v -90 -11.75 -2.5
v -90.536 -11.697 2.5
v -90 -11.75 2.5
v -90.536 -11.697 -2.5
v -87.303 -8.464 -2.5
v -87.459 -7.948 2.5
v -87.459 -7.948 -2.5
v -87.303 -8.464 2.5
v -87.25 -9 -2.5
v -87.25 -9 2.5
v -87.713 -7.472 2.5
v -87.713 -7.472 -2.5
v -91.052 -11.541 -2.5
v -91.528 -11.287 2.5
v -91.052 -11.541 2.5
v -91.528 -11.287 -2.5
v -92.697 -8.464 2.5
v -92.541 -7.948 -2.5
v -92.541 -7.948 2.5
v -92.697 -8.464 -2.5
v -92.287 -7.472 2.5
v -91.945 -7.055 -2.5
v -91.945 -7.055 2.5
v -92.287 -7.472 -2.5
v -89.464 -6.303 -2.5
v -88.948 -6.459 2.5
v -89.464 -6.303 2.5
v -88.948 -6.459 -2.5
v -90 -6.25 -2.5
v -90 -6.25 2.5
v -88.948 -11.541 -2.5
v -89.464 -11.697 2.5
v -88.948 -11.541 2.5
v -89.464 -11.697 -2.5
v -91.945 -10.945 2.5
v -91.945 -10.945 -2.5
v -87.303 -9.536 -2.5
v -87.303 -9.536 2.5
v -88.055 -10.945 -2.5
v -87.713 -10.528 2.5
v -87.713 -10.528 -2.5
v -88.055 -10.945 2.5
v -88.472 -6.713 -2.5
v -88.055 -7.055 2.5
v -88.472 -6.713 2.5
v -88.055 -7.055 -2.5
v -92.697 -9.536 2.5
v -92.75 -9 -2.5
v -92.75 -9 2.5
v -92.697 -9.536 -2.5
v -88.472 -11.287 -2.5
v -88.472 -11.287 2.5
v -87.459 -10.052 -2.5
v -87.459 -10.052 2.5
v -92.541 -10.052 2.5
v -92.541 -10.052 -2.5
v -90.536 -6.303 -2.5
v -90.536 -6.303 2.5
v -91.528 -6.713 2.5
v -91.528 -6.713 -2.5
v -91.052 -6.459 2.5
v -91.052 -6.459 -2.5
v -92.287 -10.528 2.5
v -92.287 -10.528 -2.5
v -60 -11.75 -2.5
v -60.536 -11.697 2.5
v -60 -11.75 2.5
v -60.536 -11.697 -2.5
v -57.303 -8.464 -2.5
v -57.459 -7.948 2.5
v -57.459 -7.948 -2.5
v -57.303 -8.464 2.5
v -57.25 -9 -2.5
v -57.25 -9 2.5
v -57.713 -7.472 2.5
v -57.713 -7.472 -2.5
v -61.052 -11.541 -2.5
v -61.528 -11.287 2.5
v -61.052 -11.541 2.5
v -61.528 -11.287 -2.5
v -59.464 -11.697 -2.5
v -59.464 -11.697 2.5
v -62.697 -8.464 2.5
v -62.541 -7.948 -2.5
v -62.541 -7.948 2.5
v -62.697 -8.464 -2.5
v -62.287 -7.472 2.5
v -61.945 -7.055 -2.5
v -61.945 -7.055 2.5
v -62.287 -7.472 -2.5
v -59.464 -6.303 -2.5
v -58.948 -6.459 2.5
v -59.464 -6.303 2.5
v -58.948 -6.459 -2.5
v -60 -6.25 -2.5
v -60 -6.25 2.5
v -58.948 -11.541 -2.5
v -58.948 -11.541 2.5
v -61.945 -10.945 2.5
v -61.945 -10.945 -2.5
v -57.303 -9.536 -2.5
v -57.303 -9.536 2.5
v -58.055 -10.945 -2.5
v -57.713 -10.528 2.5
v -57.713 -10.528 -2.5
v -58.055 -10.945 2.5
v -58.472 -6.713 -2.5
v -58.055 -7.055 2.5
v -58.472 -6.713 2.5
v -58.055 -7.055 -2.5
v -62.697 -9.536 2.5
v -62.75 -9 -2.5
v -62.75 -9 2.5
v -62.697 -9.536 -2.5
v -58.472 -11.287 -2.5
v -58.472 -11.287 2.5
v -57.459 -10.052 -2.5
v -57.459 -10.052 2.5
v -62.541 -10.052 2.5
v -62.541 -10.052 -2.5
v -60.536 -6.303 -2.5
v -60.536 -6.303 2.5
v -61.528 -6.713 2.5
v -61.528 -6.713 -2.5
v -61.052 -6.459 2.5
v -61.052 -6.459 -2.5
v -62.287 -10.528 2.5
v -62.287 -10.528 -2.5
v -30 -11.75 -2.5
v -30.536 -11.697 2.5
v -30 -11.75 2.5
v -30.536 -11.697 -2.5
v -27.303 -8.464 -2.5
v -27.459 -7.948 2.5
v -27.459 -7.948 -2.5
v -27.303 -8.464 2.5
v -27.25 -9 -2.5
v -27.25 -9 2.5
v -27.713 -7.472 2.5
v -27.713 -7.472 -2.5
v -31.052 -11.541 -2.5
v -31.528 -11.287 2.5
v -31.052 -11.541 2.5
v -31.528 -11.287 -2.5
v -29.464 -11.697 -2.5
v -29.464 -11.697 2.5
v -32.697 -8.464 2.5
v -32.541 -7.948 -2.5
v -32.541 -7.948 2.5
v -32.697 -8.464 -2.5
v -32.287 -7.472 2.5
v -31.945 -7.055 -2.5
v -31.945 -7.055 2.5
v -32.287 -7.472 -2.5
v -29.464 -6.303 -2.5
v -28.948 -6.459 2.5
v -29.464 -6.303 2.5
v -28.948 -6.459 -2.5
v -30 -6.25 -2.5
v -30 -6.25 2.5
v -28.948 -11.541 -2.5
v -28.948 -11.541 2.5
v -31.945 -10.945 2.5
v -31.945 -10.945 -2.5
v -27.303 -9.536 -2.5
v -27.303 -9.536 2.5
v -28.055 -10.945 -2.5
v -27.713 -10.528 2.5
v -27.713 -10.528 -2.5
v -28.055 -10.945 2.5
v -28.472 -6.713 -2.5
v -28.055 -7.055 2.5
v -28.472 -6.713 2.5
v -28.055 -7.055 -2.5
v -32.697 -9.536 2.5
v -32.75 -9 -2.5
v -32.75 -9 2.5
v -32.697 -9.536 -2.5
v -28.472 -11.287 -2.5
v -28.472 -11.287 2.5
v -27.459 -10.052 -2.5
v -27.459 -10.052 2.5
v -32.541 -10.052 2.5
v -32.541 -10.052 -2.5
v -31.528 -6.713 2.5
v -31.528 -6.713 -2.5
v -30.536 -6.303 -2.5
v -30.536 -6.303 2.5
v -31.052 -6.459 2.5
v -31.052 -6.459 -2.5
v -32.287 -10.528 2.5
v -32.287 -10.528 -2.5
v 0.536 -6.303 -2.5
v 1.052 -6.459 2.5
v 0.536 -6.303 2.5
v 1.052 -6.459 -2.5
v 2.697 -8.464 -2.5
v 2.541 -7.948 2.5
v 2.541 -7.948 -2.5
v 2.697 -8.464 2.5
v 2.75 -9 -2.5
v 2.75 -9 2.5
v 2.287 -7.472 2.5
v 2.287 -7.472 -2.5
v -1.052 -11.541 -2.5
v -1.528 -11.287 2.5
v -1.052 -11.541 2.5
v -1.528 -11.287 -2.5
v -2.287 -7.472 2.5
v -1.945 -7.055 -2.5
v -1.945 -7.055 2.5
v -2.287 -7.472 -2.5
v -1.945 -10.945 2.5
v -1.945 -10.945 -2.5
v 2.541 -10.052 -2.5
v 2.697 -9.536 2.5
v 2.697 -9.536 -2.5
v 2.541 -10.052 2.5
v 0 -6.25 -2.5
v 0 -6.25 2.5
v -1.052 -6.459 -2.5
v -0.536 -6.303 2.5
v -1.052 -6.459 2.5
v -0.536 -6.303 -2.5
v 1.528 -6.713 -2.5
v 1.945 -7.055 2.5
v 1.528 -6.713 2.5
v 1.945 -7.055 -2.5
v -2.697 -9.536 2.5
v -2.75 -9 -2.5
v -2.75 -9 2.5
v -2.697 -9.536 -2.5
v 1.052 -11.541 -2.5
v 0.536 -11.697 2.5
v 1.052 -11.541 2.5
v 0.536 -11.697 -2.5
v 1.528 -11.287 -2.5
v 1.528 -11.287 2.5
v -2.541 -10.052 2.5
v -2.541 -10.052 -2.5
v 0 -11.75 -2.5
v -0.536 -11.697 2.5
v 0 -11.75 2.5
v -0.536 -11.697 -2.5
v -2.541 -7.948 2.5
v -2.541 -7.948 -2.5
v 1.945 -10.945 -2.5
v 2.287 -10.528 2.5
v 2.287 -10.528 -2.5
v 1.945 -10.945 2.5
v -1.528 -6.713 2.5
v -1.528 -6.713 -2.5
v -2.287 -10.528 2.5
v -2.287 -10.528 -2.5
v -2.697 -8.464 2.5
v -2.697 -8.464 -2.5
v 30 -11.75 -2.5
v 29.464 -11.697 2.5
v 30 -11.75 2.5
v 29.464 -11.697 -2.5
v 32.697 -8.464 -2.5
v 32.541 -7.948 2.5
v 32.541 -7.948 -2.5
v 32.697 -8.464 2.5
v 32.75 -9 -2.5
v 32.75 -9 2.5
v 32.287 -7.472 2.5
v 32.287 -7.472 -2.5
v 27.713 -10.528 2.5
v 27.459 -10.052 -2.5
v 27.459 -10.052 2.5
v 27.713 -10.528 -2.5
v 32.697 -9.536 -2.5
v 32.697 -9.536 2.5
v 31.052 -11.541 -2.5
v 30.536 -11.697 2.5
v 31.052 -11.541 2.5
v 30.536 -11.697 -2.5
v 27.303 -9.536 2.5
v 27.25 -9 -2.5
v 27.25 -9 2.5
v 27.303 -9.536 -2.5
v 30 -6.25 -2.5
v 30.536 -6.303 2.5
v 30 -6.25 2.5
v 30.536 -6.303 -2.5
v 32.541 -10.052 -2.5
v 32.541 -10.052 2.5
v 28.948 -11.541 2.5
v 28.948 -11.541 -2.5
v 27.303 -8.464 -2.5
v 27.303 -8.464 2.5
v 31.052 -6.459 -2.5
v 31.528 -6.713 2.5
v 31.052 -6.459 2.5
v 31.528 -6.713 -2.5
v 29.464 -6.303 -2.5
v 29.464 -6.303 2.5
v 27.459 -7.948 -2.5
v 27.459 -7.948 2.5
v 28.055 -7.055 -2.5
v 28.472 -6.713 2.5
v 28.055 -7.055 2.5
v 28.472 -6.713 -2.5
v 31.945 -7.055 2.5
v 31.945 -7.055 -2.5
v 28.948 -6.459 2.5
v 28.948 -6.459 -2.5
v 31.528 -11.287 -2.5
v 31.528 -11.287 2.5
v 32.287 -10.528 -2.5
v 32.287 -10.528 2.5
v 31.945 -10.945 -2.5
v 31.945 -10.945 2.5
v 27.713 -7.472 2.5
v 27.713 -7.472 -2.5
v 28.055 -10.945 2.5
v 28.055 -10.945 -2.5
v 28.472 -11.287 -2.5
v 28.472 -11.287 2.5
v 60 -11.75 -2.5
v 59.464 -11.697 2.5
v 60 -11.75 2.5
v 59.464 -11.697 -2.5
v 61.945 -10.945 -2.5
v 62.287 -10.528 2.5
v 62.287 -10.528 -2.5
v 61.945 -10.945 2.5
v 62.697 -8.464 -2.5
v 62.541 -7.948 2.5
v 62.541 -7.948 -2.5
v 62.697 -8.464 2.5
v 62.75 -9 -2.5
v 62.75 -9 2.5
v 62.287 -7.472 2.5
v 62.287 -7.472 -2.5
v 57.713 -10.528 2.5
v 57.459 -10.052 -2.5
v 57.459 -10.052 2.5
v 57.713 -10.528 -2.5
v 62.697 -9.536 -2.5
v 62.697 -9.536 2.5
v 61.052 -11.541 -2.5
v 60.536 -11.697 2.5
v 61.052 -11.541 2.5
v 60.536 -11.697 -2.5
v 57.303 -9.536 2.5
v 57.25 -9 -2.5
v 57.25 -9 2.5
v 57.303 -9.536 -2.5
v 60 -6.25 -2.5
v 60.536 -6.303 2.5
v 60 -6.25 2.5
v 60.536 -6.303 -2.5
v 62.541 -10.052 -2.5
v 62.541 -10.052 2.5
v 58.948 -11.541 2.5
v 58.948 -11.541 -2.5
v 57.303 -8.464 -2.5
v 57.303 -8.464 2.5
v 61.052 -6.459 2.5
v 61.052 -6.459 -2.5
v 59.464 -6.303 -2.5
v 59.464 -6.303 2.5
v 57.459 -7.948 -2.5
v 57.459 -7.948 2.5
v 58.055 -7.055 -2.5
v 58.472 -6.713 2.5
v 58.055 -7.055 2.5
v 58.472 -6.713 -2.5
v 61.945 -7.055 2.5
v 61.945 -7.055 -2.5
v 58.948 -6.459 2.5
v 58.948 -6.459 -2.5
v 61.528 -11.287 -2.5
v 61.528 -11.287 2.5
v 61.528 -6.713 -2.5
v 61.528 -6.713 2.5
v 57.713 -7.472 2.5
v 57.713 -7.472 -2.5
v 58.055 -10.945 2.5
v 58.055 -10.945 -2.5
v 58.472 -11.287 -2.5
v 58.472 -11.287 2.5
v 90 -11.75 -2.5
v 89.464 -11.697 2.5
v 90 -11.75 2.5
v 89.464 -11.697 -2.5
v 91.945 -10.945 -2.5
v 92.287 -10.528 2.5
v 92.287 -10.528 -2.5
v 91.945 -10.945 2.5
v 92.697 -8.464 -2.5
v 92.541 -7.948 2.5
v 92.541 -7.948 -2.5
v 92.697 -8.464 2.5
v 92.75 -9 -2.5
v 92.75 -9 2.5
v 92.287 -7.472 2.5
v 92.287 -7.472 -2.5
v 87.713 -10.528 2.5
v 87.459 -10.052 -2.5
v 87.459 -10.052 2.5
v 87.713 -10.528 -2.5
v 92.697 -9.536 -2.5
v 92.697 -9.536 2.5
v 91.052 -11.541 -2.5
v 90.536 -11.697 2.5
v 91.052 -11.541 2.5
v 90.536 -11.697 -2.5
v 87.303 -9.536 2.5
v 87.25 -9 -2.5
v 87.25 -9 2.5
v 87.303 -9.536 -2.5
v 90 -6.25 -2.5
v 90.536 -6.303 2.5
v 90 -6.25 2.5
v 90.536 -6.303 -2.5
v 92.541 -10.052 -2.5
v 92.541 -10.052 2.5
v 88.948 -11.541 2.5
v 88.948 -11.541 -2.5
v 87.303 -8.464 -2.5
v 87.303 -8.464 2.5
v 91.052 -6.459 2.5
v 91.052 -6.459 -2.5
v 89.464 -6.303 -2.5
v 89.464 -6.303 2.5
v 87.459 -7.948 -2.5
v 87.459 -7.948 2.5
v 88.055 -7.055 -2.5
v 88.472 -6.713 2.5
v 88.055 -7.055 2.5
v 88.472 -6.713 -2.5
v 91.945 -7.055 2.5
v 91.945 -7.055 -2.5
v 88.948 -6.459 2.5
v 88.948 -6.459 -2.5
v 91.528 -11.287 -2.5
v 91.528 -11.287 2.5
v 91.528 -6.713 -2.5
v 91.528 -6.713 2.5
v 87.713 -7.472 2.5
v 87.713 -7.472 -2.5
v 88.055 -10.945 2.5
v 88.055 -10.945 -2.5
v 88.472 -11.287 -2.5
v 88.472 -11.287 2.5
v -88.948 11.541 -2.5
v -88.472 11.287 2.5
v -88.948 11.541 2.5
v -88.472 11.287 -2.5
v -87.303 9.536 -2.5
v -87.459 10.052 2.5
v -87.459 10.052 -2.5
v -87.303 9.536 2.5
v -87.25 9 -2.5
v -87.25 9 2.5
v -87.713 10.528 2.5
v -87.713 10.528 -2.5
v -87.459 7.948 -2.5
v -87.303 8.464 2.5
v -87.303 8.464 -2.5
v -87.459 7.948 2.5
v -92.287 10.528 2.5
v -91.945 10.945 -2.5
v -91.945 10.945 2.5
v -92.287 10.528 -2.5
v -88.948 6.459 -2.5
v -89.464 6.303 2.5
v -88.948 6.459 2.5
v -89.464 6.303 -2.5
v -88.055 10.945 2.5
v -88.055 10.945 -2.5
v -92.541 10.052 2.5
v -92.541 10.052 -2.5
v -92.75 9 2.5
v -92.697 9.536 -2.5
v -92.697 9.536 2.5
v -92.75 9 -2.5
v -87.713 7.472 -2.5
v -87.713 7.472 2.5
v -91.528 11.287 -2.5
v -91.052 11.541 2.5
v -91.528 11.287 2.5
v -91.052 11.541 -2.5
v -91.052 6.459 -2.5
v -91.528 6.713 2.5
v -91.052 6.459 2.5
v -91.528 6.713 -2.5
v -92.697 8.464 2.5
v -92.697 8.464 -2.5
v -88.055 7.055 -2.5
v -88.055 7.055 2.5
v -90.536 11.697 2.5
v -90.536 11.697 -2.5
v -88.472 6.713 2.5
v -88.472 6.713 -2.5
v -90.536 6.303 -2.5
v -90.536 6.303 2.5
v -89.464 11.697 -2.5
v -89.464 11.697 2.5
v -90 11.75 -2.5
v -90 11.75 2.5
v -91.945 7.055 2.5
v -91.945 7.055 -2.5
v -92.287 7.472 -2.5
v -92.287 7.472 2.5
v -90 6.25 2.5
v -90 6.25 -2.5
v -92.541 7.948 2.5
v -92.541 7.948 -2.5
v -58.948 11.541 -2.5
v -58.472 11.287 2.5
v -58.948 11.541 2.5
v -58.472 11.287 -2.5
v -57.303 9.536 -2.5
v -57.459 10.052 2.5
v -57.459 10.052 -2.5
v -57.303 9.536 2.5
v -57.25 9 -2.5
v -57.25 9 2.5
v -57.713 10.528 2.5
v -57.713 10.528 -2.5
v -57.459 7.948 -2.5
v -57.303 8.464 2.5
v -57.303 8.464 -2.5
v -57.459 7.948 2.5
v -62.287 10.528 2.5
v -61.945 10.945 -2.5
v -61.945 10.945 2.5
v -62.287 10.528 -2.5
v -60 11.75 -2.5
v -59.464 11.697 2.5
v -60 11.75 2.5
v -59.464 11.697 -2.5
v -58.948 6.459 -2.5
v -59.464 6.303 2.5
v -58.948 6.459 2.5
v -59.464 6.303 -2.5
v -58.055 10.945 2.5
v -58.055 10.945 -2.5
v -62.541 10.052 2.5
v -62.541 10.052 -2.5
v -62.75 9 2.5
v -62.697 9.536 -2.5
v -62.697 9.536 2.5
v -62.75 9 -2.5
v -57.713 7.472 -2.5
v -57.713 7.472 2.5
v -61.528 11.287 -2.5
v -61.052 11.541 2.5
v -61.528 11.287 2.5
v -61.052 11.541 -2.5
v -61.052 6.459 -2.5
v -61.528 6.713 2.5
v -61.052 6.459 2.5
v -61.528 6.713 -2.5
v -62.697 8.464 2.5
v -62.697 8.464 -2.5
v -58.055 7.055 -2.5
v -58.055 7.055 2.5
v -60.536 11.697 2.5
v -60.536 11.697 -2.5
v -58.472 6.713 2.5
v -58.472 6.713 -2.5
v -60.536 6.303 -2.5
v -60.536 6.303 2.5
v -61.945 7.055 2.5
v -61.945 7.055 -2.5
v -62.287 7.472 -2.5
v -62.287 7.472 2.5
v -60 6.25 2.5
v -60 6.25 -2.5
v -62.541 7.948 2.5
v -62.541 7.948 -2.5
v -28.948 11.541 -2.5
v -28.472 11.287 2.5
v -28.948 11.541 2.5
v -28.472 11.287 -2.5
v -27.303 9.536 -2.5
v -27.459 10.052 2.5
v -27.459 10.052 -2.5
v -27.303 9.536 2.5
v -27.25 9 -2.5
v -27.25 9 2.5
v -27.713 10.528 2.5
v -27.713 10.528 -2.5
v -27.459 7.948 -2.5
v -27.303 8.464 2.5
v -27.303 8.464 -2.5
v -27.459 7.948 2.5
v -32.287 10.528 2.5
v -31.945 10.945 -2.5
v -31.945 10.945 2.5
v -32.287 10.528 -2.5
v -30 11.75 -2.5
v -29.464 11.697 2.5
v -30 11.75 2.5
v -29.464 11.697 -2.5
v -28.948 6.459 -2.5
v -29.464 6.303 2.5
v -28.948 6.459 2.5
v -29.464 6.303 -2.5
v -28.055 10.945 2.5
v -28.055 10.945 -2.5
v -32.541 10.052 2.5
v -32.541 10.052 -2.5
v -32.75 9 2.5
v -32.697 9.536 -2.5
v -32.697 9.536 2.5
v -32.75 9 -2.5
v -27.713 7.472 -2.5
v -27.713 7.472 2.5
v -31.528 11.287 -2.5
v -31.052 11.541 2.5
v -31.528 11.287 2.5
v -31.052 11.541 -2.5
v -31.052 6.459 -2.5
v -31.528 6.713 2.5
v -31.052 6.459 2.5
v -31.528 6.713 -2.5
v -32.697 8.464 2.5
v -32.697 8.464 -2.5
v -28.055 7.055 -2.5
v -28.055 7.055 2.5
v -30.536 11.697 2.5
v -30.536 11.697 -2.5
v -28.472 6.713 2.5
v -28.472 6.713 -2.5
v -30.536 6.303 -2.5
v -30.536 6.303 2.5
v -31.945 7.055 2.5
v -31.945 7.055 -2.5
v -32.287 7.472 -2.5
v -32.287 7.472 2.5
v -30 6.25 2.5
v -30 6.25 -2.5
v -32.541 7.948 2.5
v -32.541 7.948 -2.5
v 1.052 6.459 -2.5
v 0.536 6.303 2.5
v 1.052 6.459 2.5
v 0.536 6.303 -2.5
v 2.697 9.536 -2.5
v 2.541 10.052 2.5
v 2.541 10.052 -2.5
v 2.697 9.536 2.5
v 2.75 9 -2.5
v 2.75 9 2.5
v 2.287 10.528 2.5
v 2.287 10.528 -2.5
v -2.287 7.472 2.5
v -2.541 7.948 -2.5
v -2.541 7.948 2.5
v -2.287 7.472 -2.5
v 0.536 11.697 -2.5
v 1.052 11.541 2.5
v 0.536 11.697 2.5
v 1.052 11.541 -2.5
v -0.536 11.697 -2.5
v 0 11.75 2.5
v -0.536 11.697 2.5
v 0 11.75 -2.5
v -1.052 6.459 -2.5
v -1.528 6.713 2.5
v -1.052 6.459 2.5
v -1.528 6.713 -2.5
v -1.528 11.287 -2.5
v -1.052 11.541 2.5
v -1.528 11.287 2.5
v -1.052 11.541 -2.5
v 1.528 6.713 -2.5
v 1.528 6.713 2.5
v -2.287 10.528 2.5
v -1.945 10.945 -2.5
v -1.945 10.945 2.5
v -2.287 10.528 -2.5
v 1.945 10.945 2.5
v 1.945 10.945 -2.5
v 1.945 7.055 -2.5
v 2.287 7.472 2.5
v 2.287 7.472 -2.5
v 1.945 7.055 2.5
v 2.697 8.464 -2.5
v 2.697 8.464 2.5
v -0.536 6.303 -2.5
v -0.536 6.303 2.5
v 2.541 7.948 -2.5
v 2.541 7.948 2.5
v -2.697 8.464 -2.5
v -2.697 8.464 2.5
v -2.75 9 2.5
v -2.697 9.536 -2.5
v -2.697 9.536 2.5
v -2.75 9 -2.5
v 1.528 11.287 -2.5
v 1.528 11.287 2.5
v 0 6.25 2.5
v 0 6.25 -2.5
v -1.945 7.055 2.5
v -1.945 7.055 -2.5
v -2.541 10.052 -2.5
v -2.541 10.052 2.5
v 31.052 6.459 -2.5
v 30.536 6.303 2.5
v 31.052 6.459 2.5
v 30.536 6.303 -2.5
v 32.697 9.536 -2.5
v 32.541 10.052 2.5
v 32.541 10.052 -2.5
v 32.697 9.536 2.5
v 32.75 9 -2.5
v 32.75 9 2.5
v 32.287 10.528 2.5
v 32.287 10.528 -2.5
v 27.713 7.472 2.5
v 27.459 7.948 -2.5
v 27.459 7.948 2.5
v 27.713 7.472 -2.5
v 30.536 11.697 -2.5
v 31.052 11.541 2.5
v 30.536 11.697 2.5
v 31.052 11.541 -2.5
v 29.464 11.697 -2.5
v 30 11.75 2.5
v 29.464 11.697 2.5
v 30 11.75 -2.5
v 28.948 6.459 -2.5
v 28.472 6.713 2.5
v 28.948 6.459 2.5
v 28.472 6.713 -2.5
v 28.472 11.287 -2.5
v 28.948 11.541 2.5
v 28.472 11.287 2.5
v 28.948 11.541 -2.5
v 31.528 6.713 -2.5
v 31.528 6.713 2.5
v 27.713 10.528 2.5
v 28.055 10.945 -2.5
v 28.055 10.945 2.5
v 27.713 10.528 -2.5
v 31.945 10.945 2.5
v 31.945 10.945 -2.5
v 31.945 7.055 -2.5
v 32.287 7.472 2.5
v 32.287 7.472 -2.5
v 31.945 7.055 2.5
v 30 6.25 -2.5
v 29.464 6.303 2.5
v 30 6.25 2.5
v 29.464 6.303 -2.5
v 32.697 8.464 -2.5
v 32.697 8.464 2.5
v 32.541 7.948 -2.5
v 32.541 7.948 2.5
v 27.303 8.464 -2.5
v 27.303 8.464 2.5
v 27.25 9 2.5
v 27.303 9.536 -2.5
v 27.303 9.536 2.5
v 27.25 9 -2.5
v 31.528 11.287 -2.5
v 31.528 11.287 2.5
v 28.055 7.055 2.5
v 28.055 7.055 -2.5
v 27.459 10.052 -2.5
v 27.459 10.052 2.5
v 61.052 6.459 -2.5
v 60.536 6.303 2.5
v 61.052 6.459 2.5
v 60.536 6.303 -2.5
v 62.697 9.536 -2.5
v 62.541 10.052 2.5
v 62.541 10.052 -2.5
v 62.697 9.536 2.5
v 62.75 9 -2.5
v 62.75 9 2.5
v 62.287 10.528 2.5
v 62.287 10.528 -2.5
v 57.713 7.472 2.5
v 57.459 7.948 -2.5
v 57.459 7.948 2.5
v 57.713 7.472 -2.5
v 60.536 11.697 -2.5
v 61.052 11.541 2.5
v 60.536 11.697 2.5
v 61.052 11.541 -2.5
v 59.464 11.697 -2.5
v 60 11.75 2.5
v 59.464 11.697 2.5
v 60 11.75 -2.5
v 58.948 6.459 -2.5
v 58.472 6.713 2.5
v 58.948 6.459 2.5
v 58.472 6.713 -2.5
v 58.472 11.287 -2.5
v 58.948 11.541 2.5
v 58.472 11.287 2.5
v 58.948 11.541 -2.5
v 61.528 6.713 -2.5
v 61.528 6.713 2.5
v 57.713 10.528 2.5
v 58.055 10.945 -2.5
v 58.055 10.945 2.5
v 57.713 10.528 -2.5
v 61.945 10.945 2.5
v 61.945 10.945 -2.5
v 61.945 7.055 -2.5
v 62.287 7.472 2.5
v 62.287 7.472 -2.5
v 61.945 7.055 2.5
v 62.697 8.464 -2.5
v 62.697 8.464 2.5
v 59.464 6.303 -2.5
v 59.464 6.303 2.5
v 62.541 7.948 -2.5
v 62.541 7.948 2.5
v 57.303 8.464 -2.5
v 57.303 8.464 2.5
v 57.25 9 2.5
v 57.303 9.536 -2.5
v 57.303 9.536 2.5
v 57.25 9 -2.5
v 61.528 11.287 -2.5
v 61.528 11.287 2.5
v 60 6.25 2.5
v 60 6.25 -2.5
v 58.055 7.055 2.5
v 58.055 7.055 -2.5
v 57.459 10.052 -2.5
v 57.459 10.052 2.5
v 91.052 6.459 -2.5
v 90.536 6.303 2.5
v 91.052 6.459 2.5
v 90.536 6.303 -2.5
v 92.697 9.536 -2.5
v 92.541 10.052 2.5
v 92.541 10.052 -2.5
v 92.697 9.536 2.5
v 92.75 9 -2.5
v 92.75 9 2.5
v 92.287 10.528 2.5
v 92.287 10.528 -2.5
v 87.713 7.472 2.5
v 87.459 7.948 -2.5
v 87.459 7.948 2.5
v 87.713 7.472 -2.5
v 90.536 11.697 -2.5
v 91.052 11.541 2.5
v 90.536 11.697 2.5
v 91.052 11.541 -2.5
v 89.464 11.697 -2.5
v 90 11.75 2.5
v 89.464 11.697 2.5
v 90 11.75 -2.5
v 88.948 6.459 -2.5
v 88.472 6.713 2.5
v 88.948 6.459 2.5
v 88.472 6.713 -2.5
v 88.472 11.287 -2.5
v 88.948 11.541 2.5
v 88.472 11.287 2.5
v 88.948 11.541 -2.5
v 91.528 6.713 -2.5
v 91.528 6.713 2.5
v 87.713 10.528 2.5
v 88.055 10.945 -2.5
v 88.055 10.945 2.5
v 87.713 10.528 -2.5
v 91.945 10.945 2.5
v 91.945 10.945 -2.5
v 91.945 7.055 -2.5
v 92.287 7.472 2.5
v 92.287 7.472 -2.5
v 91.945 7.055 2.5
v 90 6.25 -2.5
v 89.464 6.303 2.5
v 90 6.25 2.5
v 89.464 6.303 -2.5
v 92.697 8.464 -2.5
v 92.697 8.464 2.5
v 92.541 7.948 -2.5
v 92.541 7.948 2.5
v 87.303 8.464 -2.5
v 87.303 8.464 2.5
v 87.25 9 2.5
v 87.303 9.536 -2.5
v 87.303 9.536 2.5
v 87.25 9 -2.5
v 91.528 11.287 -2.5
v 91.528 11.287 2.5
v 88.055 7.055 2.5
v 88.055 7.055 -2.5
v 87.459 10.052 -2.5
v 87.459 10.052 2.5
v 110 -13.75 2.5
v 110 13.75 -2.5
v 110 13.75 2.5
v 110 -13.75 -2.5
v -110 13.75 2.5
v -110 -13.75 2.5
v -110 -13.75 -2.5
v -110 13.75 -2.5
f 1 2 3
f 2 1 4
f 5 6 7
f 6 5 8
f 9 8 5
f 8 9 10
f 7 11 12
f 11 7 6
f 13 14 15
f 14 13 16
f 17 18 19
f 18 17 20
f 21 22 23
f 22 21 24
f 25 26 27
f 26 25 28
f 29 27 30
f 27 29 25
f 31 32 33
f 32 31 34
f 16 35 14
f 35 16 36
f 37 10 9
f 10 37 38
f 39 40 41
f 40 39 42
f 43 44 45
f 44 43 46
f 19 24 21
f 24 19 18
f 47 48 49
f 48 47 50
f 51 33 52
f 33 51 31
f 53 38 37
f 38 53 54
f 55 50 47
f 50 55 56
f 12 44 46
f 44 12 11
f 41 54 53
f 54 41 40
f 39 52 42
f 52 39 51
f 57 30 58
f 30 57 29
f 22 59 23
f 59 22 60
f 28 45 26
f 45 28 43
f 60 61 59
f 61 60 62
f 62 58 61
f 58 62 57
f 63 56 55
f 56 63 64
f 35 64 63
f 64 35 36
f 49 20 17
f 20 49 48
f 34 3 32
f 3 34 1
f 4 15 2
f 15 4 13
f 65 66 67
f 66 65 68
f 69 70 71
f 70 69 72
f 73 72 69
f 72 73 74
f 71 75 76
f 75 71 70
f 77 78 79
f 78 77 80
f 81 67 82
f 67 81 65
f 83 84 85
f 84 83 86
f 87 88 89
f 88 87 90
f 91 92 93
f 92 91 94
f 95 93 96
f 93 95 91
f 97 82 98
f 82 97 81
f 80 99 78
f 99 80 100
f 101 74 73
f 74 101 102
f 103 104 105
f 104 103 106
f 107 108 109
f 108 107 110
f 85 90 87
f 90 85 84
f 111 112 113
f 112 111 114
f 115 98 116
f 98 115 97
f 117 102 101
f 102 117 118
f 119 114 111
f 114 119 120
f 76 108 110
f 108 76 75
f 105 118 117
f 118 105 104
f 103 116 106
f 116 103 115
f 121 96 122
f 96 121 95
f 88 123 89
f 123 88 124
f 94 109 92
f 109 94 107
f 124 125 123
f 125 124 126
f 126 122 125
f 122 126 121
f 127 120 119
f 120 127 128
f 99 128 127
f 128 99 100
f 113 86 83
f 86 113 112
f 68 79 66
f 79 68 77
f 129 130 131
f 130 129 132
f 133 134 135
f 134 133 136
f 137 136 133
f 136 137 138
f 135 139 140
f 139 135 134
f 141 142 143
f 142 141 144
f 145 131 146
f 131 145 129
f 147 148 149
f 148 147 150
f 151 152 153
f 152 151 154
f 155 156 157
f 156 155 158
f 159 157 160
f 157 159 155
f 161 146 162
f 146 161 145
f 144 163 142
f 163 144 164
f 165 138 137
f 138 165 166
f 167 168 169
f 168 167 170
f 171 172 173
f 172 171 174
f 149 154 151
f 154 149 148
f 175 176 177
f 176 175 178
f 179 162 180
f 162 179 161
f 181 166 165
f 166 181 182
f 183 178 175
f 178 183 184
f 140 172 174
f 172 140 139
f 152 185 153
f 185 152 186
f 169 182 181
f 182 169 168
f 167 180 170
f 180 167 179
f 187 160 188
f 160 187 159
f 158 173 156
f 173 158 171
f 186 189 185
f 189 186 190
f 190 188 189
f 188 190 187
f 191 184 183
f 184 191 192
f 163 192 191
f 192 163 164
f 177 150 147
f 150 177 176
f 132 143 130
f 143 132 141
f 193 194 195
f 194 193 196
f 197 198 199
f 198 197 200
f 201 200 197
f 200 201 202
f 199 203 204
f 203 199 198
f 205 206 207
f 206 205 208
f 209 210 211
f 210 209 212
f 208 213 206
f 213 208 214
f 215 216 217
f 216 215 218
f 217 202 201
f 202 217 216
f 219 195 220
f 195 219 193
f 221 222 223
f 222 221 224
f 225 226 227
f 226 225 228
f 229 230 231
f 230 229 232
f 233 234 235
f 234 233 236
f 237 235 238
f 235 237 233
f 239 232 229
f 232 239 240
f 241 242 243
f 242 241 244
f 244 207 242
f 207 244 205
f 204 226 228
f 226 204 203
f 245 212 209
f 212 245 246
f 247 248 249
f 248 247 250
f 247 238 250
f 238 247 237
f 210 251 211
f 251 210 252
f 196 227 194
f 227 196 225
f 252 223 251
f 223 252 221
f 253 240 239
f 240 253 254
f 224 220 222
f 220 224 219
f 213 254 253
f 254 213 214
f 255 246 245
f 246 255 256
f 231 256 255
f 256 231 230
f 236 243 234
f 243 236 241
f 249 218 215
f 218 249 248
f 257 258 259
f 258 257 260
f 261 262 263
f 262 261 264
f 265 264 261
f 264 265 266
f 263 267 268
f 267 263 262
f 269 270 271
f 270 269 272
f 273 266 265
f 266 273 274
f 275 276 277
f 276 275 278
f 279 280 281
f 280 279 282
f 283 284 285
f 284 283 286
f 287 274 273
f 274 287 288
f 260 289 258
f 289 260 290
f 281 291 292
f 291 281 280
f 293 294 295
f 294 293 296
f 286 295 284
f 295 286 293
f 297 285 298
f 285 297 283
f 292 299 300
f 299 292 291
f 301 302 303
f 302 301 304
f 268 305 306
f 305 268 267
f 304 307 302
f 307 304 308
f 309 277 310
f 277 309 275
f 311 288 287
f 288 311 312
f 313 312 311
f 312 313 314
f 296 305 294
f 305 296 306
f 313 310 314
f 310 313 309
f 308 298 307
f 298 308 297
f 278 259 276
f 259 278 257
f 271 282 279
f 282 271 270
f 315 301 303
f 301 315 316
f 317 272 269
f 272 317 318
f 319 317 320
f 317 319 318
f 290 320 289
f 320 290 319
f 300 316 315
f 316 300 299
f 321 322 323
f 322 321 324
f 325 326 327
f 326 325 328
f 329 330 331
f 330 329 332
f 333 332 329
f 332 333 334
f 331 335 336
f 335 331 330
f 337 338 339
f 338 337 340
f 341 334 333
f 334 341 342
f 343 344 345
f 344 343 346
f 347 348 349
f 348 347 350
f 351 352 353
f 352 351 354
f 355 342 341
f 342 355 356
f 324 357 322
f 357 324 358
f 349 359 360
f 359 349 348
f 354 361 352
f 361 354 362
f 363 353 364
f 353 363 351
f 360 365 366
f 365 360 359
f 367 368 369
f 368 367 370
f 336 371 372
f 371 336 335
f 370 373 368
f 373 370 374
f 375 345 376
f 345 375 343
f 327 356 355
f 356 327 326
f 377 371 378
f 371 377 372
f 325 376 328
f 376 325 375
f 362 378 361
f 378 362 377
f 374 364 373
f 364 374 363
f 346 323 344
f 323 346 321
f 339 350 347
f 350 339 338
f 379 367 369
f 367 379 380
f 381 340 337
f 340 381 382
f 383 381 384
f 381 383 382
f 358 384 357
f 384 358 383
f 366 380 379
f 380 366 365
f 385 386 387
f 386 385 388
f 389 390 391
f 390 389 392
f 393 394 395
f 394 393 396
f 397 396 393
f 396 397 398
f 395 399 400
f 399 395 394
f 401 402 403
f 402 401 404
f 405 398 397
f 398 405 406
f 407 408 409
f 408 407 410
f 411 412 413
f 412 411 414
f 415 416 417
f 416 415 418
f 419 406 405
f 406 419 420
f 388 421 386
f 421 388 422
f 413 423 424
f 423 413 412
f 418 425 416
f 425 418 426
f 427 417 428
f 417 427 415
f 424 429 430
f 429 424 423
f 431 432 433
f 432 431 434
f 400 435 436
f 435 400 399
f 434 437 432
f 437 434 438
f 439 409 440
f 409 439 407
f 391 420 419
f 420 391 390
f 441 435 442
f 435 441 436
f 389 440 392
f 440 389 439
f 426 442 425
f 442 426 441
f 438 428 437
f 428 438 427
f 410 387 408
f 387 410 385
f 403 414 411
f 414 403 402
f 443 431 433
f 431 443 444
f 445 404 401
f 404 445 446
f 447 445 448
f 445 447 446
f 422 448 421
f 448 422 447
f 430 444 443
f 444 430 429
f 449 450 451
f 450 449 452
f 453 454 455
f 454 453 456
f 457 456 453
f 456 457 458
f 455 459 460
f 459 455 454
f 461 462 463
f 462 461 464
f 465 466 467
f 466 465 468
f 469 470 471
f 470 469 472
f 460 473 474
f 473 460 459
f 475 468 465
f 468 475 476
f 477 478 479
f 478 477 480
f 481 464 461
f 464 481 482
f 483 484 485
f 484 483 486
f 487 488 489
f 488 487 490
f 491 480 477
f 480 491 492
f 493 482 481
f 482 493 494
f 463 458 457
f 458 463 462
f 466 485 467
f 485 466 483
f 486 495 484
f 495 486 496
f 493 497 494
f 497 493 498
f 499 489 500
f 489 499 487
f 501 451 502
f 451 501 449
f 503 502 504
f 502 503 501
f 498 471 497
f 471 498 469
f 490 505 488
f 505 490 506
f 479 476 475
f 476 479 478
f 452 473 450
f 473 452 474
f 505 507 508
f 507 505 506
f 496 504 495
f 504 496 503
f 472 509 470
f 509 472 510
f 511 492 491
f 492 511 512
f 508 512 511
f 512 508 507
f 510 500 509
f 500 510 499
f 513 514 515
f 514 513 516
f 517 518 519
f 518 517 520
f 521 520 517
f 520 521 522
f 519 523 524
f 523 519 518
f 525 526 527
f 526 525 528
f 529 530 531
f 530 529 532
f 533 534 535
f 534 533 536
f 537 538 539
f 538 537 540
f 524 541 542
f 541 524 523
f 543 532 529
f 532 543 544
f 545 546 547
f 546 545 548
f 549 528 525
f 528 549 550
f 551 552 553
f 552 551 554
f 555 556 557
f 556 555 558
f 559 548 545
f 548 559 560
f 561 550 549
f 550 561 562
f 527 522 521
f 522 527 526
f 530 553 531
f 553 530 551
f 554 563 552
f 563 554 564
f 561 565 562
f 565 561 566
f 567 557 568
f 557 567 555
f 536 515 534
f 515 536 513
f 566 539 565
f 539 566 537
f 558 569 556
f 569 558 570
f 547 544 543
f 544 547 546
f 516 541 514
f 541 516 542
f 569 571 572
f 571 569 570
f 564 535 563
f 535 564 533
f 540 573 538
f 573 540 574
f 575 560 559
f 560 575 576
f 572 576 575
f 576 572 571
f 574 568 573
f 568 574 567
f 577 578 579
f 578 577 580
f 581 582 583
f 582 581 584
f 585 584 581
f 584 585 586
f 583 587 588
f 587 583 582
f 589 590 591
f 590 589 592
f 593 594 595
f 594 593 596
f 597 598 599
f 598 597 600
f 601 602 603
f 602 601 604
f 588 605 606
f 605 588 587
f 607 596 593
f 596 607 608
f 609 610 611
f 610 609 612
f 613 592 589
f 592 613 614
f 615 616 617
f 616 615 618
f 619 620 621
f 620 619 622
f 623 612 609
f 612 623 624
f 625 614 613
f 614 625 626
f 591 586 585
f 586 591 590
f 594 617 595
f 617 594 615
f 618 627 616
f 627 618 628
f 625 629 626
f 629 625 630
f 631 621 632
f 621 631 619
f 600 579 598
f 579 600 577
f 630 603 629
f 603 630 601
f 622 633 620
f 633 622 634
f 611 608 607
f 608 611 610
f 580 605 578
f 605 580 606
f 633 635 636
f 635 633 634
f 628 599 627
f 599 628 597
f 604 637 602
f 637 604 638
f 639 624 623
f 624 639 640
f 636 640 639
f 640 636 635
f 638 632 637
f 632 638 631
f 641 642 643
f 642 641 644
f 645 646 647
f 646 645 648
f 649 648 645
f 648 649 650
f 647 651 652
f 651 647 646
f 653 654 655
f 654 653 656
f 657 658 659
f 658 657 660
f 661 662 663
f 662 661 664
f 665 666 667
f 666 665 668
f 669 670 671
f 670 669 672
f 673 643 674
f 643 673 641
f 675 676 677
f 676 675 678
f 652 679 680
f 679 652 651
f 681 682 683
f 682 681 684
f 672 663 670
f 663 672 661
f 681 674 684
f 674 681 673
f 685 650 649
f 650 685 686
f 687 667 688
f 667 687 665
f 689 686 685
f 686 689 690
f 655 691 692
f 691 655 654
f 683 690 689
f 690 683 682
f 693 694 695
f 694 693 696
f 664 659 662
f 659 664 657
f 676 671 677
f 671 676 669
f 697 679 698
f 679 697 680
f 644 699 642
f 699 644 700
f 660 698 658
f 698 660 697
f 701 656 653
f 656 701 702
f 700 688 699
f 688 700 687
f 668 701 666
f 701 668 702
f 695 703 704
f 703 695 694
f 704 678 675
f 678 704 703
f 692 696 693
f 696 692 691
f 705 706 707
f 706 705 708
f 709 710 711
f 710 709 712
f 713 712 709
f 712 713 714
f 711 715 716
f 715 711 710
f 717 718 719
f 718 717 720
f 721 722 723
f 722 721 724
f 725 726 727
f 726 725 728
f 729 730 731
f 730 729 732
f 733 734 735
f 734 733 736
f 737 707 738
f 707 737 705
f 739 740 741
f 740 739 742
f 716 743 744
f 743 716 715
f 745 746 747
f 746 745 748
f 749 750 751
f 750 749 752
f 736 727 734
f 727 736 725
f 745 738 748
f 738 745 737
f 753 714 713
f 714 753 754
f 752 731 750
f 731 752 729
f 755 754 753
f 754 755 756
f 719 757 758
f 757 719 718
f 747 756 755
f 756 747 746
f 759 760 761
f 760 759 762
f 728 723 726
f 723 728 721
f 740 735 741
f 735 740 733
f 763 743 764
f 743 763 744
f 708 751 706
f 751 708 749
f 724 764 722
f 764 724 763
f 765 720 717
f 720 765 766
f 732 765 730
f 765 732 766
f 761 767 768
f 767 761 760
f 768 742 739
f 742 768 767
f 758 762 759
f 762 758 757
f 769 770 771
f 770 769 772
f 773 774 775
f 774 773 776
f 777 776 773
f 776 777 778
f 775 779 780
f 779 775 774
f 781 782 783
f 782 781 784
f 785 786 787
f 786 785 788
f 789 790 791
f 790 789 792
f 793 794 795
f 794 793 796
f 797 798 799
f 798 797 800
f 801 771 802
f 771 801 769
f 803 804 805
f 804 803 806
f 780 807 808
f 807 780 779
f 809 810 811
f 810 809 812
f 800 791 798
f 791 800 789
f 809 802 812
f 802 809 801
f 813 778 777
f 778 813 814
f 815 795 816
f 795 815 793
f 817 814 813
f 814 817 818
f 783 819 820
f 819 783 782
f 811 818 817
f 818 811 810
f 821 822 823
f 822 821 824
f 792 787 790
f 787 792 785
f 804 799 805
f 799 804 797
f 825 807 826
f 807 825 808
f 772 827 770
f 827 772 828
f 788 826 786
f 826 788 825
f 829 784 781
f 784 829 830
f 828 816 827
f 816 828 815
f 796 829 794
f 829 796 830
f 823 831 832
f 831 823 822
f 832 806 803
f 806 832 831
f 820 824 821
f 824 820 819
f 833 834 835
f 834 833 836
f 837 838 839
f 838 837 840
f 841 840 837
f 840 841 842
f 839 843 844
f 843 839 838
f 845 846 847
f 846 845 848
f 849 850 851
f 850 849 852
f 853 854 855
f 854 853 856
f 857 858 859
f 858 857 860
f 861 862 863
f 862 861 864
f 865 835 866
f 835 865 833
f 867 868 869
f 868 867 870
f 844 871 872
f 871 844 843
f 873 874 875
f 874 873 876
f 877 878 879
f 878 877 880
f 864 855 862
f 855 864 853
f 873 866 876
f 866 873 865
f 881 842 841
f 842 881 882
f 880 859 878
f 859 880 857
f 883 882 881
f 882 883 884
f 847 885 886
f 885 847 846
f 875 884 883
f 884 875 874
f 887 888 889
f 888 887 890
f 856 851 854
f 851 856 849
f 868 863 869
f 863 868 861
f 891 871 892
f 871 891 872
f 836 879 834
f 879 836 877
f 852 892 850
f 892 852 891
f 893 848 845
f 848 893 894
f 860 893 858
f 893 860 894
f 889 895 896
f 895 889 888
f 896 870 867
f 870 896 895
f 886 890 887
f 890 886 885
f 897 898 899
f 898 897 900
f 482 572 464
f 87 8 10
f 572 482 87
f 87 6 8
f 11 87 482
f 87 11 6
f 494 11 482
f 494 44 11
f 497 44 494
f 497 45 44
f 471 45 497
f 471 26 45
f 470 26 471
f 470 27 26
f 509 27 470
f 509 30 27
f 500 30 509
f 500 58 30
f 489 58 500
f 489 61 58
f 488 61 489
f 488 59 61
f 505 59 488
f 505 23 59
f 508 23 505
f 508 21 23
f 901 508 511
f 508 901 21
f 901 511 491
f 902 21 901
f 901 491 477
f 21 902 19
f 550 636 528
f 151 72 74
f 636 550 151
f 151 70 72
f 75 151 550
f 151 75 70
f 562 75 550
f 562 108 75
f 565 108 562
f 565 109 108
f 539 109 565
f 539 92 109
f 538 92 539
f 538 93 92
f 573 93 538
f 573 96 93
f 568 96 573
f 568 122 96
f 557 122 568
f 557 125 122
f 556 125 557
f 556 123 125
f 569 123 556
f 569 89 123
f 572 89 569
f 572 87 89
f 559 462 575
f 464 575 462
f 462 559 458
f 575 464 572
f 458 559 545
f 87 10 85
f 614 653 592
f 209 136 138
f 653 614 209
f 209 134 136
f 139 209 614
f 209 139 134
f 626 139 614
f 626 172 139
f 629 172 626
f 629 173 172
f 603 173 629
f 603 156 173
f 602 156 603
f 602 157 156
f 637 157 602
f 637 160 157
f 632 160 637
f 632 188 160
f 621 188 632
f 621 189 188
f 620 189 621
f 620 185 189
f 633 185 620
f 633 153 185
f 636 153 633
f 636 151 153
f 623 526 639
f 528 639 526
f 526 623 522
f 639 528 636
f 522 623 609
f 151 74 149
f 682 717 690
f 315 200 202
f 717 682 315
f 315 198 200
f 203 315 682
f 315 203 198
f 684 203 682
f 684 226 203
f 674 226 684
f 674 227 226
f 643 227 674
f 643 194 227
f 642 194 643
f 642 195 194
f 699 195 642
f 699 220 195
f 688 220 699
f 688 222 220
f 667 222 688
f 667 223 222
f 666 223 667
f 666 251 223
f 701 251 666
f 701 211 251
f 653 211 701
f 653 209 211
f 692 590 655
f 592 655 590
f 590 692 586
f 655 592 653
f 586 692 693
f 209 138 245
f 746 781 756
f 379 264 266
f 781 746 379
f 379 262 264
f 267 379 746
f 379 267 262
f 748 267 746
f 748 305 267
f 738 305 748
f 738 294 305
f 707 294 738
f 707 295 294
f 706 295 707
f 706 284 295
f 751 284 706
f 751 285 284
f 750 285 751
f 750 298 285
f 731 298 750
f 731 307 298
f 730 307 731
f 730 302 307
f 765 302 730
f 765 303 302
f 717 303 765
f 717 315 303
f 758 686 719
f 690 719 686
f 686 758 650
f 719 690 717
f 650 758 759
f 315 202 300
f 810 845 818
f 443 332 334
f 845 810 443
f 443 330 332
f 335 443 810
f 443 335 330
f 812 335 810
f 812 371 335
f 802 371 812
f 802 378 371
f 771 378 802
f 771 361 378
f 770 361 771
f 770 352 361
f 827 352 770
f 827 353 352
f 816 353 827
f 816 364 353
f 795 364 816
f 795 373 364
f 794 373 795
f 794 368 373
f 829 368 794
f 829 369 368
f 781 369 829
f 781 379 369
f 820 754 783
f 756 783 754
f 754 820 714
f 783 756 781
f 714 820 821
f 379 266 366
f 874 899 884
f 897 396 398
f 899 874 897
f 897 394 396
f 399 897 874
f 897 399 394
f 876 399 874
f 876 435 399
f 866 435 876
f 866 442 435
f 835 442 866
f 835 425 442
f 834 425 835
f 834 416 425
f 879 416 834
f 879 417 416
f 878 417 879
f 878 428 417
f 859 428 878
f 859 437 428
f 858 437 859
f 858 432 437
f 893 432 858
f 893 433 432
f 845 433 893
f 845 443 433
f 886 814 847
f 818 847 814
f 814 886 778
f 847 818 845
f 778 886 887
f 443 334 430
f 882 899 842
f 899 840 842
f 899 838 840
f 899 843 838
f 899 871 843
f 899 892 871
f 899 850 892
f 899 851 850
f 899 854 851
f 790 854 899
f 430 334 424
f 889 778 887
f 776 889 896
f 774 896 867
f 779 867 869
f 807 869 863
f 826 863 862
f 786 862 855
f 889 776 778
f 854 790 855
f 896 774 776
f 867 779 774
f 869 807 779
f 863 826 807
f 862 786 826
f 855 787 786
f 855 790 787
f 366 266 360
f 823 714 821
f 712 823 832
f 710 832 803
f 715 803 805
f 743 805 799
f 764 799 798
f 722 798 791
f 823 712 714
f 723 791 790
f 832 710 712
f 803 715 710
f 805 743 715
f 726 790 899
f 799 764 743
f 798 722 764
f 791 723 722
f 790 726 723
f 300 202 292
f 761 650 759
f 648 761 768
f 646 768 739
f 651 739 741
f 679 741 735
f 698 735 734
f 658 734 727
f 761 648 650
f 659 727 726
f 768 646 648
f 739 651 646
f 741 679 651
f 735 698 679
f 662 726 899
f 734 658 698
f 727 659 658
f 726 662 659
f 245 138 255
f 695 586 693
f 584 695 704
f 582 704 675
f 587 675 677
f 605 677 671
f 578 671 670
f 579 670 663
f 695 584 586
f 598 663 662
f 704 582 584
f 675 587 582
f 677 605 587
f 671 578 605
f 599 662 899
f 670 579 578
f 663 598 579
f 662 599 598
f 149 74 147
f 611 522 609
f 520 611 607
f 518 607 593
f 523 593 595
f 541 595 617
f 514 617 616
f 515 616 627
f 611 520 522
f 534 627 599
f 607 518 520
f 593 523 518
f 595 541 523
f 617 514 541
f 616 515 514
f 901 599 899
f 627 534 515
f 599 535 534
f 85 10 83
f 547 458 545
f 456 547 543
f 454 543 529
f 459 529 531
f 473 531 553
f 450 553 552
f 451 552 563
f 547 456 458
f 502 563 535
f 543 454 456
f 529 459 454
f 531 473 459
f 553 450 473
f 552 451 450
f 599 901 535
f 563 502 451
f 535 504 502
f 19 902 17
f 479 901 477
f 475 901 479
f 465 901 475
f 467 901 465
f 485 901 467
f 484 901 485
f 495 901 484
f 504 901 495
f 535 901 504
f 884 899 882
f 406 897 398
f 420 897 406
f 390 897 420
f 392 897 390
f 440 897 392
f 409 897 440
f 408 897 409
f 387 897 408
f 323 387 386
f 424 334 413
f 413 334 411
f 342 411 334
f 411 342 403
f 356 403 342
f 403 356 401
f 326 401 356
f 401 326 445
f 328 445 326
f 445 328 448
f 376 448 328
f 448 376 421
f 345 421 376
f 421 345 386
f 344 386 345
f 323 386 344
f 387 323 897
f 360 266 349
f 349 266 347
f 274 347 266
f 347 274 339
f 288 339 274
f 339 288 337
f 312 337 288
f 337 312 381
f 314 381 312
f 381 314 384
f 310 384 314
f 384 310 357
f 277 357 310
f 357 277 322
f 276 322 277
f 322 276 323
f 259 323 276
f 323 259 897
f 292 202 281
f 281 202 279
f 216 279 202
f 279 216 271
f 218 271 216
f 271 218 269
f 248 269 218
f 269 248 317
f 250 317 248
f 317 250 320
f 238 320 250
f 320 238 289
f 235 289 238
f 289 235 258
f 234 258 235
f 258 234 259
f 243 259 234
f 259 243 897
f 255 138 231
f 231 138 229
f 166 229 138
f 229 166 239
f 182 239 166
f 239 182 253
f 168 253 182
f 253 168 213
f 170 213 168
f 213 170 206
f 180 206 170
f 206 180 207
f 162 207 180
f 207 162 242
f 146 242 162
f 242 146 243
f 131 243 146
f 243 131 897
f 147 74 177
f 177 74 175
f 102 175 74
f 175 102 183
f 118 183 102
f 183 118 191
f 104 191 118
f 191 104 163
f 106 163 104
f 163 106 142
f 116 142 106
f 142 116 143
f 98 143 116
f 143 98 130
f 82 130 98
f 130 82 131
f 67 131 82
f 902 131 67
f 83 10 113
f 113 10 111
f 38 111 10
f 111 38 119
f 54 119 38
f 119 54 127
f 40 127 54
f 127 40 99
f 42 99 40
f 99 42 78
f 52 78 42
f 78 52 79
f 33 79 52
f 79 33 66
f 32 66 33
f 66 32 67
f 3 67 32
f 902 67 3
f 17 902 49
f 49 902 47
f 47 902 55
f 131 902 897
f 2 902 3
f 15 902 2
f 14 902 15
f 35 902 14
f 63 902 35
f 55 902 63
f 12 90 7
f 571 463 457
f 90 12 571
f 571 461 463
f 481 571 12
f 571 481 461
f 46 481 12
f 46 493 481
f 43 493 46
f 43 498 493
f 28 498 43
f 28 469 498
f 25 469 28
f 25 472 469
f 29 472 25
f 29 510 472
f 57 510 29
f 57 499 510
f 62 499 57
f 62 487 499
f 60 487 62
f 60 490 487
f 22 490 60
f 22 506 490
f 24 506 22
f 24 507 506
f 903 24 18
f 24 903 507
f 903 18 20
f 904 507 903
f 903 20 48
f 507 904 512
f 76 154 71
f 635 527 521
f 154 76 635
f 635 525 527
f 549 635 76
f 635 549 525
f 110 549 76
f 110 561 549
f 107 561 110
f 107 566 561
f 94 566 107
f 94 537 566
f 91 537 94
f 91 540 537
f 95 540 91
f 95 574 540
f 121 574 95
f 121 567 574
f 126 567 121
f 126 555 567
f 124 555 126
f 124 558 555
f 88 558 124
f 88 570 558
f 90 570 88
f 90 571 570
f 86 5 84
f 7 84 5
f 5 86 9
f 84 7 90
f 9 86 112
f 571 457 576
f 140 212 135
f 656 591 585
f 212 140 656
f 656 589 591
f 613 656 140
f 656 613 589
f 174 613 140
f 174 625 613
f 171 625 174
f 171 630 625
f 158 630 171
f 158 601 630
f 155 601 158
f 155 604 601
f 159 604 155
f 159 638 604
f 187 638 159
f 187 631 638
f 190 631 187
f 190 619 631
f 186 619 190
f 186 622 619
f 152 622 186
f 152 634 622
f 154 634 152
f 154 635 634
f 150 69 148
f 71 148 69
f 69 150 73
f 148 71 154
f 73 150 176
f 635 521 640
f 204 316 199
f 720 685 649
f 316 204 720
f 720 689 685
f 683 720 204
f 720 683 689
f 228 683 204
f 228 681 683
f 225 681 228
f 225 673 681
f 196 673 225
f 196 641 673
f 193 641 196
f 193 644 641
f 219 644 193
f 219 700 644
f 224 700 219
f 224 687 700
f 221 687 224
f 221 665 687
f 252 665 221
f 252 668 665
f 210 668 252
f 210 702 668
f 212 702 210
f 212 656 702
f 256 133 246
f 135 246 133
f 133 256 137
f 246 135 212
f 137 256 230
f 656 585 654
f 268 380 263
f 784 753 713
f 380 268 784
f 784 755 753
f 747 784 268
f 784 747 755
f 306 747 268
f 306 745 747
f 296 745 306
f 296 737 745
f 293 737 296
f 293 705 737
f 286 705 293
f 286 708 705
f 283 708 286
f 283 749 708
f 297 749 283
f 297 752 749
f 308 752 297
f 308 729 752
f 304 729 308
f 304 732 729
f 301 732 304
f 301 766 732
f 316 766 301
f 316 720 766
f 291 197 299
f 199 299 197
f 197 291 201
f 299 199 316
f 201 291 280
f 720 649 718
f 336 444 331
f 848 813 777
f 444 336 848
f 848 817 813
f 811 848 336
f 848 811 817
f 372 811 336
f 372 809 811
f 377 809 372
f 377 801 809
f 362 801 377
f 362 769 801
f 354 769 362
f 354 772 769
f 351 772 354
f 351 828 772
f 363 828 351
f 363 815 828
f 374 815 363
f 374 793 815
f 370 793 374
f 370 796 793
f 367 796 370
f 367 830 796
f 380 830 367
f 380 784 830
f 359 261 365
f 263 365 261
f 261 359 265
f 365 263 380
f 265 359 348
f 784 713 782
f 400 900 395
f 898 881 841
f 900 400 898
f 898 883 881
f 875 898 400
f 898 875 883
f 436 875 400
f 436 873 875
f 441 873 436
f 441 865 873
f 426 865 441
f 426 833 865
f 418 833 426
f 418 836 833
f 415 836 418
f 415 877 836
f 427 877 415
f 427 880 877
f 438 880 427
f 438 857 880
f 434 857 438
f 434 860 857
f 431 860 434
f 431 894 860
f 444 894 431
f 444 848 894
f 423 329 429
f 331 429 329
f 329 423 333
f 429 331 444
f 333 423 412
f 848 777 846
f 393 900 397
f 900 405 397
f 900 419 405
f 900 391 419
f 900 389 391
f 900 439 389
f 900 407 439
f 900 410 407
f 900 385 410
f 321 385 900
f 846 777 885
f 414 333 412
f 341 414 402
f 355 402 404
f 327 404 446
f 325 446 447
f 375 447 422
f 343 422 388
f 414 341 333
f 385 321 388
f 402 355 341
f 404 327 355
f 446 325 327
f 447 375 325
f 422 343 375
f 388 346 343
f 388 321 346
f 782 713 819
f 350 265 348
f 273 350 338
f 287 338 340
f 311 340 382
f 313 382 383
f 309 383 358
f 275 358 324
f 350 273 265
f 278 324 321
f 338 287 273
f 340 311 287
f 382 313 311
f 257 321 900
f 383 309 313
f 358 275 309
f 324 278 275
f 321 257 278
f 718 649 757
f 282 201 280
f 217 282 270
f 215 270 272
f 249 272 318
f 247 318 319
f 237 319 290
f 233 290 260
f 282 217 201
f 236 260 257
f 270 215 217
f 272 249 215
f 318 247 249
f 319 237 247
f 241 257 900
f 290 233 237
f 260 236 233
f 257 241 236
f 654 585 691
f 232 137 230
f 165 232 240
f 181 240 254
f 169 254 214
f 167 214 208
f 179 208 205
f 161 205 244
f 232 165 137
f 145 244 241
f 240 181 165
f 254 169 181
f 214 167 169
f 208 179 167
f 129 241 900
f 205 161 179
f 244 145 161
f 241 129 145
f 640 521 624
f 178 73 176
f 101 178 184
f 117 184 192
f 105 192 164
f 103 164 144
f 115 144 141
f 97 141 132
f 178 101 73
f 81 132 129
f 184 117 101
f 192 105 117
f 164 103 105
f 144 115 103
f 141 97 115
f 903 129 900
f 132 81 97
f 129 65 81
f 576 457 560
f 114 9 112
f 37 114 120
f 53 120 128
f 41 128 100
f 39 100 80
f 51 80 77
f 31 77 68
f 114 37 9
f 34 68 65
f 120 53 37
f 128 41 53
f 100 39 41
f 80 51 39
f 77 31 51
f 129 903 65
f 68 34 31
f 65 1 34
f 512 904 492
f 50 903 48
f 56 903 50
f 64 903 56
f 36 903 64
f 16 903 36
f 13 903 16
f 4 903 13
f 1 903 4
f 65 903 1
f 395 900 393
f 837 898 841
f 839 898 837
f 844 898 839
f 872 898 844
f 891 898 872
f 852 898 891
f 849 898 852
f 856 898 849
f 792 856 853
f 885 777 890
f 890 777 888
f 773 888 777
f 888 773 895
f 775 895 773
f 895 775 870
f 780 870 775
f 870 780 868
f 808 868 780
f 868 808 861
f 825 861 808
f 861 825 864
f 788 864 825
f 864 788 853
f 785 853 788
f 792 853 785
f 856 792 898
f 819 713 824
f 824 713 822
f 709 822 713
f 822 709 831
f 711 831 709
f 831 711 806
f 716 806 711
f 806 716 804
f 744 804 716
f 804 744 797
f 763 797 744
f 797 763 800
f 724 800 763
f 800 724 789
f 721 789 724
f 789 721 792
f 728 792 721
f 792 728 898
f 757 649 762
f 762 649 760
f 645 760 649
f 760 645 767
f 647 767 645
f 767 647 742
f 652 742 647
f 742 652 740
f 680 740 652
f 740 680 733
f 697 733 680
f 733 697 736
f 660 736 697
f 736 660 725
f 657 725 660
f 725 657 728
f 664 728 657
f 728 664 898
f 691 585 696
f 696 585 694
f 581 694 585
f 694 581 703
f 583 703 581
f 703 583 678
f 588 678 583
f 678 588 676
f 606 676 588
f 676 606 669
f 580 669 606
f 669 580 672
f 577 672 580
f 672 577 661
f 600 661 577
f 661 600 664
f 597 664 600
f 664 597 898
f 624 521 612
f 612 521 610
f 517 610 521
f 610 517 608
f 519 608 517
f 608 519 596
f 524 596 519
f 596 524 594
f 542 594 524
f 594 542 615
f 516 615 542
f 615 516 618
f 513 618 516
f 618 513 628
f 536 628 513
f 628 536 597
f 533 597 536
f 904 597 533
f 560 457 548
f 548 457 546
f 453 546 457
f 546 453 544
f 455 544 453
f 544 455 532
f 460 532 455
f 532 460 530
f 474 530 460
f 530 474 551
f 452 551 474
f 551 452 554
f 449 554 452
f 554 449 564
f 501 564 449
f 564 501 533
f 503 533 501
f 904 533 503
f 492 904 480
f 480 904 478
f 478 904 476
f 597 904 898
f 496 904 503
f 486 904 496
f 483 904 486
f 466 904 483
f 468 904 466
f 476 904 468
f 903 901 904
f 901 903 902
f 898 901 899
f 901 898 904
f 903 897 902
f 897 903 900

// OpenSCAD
$fn = 32;

// ----------------------------------------------------------------------
// Hole bar, 7 x Ø5.5
// tworows layout, 20 mm edge offset
// ----------------------------------------------------------------------

// --- parameters (mm) ---
bar_w = 27.5;     // bar width (Y)
bar_t = 5;        // bar thickness (Z)
holes = 7;        // holes per row
hole_d = 5.5;     // hole diameter
edge = 20;        // offset from the bar end to the first hole
pitch = 30;       // pitch between neighbouring holes
row_offset = 18;  // distance between the two rows

// --- derived feature positions (mm) ---
span = (holes - 1) * pitch;   // = 180   distance between the end holes
bar_l = span + 2 * edge;      // = 220   overall bar length
start_x = -bar_l / 2 + edge;  // = -90   X of the first hole
feature_centers = [
  [start_x + 0 * pitch, -row_offset / 2],
  [start_x + 1 * pitch, -row_offset / 2],
  [start_x + 2 * pitch, -row_offset / 2],
  [start_x + 3 * pitch, -row_offset / 2],
  [start_x + 4 * pitch, -row_offset / 2],
  [start_x + 5 * pitch, -row_offset / 2],
  [start_x + 6 * pitch, -row_offset / 2]
];   // hole centres of the first row
row2_centers = [
  [start_x + 0 * pitch, row_offset / 2],
  [start_x + 1 * pitch, row_offset / 2],
  [start_x + 2 * pitch, row_offset / 2],
  [start_x + 3 * pitch, row_offset / 2],
  [start_x + 4 * pitch, row_offset / 2],
  [start_x + 5 * pitch, row_offset / 2],
  [start_x + 6 * pitch, row_offset / 2]
];   // hole centres of the second row

// bar with two rows of holes, both read from their own centre arrays
difference() {
  translate([-bar_l / 2, -bar_w / 2, -bar_t / 2]) cube([bar_l, bar_w, bar_t]);
  for (centre = feature_centers)
    translate([centre[0], centre[1], 0])
      cylinder(d = hole_d, h = bar_t + 2, center = true);
  for (centre = row2_centers)
    translate([centre[0], centre[1], 0])
      cylinder(d = hole_d, h = bar_t + 2, center = true);
}
